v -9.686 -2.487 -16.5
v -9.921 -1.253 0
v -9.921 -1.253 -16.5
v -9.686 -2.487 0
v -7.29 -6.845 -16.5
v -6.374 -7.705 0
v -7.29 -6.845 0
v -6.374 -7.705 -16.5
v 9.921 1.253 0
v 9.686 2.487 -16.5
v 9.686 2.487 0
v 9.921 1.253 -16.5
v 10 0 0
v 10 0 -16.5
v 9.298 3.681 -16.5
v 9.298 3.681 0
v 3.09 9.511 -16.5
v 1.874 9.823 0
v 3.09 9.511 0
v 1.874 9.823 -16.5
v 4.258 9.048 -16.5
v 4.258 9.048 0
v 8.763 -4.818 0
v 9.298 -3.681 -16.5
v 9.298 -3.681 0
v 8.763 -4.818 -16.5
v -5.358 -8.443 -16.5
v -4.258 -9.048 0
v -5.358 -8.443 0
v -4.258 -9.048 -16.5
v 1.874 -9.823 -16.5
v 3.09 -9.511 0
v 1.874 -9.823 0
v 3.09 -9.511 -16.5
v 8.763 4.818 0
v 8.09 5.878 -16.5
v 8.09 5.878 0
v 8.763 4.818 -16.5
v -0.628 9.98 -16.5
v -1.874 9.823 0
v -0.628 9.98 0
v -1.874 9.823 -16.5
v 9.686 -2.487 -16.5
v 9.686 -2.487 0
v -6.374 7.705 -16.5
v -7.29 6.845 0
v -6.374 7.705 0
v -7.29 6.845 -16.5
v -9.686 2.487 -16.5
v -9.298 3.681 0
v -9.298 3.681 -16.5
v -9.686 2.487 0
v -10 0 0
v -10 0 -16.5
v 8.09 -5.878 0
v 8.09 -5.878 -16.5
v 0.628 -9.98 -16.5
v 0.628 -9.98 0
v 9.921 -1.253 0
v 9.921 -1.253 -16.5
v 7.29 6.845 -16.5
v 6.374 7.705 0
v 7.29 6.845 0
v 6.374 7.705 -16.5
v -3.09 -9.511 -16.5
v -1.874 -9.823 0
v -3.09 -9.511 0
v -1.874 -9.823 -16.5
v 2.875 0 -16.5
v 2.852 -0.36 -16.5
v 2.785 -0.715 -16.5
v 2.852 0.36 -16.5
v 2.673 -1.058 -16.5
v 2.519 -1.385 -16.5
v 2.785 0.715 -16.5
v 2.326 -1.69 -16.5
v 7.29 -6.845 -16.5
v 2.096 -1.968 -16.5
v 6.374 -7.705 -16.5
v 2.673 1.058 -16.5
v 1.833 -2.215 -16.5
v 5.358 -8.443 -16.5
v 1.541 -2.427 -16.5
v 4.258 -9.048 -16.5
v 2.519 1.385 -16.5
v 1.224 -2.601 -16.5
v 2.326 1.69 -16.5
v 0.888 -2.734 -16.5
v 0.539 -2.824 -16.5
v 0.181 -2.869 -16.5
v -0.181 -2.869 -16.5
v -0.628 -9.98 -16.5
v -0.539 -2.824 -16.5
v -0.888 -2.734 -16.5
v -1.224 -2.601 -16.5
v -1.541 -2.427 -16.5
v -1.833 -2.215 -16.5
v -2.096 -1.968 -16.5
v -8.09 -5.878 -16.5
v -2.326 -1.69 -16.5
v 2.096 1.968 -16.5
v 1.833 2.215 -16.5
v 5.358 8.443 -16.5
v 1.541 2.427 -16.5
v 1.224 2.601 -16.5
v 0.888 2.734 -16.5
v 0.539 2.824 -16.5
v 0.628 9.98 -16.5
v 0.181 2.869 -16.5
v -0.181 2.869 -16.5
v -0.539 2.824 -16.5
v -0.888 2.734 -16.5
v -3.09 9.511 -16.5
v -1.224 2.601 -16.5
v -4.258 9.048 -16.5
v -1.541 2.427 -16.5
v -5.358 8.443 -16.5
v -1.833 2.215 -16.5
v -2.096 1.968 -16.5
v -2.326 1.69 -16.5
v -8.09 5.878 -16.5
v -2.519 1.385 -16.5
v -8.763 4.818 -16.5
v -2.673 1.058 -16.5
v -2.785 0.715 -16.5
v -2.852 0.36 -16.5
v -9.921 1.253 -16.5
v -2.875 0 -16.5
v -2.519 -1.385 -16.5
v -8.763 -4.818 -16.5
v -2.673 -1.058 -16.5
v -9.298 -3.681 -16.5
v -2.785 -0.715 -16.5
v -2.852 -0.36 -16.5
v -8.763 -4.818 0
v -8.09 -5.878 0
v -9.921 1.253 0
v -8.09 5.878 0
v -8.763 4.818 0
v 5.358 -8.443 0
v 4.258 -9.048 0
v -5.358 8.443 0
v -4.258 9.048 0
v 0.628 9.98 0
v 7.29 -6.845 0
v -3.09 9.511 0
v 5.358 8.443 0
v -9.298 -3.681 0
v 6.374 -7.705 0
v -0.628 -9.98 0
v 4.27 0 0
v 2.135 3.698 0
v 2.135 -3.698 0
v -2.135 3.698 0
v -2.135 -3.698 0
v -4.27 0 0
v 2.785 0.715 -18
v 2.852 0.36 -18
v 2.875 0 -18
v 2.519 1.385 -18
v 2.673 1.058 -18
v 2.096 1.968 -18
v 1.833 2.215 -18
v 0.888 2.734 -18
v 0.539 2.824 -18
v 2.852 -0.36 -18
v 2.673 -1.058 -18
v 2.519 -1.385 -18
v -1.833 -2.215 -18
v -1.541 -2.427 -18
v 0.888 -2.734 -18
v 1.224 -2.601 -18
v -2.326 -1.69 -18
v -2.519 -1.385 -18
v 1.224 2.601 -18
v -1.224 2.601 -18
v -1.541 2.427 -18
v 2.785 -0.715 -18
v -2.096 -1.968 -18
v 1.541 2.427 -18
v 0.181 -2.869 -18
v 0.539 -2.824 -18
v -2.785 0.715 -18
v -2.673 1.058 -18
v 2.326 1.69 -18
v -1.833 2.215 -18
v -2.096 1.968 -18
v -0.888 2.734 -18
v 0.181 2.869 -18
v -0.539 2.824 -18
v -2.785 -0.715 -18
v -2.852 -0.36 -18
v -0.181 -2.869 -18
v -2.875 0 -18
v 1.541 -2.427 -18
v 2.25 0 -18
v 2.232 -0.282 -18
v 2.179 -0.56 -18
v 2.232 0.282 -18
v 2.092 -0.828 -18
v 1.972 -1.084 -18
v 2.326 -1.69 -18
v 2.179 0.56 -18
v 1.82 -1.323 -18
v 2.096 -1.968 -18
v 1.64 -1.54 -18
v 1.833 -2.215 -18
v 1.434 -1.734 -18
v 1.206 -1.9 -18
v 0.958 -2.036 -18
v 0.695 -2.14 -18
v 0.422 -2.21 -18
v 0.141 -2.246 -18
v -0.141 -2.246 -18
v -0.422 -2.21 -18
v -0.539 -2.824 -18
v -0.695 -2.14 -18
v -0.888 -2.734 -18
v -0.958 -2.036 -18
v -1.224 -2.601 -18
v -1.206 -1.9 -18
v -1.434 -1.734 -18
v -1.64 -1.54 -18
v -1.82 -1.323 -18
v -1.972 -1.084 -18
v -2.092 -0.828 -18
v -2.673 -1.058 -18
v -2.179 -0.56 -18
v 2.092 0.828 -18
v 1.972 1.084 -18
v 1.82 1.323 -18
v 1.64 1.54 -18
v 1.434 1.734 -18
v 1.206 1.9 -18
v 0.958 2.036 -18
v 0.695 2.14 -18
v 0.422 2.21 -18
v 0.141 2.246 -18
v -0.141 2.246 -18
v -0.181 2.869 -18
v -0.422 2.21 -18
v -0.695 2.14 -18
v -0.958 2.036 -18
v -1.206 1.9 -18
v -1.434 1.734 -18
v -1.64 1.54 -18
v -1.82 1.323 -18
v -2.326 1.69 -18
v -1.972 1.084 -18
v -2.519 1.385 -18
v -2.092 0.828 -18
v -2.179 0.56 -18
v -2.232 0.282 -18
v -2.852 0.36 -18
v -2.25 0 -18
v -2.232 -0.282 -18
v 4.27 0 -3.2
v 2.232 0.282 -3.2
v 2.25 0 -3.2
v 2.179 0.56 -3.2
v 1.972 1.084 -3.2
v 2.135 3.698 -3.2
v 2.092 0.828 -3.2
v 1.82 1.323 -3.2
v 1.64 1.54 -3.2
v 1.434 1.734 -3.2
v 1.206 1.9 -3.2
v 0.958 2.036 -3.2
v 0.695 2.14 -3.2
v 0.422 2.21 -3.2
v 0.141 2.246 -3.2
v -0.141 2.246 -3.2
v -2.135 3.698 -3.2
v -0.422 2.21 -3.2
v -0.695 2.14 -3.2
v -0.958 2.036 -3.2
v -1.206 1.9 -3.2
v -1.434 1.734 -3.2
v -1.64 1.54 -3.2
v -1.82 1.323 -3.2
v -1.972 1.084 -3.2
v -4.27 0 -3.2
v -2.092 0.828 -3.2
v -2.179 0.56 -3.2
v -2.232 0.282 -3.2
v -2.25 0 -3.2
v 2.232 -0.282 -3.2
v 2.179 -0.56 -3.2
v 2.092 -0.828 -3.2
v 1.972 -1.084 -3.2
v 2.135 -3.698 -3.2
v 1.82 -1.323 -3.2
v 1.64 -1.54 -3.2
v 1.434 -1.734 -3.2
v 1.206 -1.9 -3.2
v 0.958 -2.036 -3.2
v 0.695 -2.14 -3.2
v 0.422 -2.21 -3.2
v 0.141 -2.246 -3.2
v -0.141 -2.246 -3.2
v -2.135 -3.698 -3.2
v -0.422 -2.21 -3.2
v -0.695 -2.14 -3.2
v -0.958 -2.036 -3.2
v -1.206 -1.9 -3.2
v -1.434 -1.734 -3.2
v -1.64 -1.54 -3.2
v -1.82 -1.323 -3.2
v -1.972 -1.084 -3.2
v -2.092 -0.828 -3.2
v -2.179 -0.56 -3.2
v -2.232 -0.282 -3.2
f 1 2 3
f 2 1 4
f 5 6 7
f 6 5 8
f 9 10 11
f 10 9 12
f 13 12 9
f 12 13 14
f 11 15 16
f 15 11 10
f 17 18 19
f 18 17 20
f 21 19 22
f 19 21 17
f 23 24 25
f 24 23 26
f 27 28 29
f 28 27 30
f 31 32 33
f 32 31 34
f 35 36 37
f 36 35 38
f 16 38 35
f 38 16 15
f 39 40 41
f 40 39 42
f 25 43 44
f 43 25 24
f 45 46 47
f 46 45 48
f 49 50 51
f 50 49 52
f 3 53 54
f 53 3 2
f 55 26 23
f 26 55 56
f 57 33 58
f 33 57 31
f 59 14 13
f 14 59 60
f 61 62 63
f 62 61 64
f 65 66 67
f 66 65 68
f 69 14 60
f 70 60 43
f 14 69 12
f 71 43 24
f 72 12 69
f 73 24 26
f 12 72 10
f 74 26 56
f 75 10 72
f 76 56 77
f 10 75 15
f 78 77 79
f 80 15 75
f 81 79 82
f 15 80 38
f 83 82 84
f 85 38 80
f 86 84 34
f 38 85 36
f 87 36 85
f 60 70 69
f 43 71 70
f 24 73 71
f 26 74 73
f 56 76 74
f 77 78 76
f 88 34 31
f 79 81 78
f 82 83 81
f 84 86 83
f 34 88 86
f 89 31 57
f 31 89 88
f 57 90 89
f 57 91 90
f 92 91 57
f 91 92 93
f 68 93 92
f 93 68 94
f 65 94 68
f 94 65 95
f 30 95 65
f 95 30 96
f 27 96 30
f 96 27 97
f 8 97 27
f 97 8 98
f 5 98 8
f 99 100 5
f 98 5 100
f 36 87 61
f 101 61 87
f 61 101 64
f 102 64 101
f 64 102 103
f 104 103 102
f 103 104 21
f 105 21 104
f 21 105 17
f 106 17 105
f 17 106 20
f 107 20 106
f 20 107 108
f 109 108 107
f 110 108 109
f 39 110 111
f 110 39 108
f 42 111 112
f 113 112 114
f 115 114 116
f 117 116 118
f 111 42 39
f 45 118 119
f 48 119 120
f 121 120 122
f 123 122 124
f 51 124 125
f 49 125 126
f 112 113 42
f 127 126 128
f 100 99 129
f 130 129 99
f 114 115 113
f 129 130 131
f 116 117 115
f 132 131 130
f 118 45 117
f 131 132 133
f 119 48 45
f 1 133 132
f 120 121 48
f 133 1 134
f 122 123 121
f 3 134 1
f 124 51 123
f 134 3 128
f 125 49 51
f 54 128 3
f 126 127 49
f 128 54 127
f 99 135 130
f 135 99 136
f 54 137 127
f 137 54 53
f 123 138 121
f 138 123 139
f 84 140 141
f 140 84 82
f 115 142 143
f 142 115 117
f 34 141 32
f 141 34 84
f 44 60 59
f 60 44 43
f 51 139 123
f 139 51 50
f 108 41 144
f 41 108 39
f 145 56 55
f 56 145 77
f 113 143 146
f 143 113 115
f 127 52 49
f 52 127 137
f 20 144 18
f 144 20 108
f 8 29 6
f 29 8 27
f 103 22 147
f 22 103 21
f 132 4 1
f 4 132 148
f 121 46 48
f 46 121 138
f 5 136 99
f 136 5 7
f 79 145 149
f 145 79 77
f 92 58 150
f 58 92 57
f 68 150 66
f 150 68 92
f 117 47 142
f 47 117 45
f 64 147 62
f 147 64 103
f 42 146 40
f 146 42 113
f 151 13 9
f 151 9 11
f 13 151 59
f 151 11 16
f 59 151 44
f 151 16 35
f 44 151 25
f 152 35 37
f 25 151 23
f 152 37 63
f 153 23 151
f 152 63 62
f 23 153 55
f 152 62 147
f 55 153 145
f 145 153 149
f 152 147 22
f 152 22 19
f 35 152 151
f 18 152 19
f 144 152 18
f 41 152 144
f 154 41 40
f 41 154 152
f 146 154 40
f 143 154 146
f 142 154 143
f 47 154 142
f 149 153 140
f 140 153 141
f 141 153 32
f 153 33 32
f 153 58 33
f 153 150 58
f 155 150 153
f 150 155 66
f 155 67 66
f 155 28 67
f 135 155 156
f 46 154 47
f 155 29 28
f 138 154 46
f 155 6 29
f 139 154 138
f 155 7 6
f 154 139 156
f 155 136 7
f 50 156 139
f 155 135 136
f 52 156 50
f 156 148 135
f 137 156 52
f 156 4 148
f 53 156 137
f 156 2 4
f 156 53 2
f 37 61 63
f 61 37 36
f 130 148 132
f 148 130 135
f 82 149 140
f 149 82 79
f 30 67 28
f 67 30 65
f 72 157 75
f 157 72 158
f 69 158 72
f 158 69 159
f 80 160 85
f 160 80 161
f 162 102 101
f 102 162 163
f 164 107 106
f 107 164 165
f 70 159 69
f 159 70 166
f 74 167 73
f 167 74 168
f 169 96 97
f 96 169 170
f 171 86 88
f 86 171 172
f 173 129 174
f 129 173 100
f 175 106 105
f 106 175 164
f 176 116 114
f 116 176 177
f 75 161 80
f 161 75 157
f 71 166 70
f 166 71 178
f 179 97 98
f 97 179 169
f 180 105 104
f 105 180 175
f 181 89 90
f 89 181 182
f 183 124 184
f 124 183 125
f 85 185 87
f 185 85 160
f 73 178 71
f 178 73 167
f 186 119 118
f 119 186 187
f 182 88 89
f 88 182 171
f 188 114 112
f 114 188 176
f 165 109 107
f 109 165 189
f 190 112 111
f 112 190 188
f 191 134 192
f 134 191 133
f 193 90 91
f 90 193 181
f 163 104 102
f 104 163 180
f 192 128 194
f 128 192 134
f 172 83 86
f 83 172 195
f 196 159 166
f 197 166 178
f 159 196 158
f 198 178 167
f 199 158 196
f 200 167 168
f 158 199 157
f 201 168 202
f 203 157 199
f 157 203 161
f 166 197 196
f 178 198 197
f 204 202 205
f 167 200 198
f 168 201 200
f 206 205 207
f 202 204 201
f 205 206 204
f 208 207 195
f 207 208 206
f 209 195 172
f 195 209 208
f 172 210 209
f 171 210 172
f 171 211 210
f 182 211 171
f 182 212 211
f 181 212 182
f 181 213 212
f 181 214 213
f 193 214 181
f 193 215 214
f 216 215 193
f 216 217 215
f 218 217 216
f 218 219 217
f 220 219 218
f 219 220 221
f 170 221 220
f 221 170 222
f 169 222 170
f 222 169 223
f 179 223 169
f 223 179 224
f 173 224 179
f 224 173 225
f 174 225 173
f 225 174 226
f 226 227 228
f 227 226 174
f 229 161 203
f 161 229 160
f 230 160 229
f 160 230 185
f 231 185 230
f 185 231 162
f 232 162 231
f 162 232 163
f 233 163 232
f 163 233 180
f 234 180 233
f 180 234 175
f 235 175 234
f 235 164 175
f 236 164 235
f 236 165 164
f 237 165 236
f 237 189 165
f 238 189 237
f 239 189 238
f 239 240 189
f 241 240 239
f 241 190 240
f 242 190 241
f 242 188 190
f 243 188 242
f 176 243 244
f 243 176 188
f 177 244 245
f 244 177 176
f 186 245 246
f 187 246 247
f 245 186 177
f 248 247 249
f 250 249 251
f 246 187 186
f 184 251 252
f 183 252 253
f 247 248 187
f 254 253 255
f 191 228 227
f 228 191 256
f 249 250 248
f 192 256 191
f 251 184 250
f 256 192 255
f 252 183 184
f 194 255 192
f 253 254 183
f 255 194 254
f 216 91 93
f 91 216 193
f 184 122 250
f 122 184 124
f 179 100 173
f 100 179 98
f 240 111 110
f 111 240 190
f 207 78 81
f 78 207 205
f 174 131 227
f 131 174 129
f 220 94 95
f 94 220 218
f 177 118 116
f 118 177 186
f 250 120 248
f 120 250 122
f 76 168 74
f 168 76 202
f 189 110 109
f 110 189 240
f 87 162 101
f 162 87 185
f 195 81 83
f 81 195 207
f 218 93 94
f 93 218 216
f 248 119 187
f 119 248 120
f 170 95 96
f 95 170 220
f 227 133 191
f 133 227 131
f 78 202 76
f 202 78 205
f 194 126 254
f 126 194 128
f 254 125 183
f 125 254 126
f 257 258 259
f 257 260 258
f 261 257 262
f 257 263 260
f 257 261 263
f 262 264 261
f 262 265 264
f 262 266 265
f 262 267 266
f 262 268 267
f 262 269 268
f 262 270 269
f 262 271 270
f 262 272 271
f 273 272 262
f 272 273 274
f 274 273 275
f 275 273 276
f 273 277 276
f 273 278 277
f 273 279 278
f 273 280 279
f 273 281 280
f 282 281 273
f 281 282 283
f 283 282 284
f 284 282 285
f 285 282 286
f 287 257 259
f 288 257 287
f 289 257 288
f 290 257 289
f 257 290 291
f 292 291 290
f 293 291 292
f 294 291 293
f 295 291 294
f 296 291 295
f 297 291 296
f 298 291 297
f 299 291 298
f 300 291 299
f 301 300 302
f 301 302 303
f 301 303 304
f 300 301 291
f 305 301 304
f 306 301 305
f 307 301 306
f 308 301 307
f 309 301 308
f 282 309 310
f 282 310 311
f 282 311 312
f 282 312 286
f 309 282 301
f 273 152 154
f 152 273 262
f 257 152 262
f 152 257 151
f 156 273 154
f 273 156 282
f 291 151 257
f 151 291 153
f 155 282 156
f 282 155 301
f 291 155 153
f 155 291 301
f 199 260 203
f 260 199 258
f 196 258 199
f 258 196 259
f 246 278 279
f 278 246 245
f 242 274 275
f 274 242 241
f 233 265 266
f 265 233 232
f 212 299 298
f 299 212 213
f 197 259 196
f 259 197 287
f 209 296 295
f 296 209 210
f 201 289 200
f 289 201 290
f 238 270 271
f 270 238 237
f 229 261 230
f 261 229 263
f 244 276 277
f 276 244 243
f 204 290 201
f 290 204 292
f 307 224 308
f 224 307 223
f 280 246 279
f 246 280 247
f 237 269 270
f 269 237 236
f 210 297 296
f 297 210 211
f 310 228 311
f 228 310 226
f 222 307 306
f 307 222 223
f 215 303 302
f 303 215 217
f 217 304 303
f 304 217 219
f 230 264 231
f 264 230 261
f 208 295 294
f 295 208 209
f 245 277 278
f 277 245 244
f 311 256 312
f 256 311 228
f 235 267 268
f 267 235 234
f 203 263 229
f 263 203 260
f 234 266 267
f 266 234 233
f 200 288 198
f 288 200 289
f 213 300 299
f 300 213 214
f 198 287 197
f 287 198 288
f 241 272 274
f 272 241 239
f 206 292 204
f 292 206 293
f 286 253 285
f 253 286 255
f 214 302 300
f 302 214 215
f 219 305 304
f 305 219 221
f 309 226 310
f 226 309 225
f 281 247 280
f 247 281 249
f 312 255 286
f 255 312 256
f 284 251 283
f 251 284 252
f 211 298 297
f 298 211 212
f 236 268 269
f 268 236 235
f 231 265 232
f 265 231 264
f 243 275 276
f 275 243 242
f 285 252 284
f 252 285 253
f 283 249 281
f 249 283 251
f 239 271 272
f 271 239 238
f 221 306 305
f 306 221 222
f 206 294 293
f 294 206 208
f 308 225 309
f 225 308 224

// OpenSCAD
$fn = 50;

difference() {
	union() {
		translate(v = [0, 0, -16.5]) {
			cylinder(h = 16.5, r = 10.0);
		}
		#translate(v = [0, 0, -18.0]) {
			cylinder(h = 18, r = 2.875);
		}
	}
	union() {
		translate(v = [0, 0, 0]) {
			rotate(a = [0, 0, 0]) {
				difference() {
					union() {
						translate(v = [0, 0, -3.2]) {
							linear_extrude(height = 3.2) {
								polygon(points = [[4.2698, 0.0], [2.1349000000000005, 3.697755269078796], [-2.134899999999999, 3.6977552690787965], [-4.2698, 5.228996902999369e-16], [-2.134900000000002, -3.6977552690787956], [2.1348999999999974, -3.697755269078798]]);
							}
						}
					}
					union();
				}
			}
		}
		#translate(v = [0, 0, -100.0]) {
			cylinder(h = 200, r = 2.25);
		}
	}
}
